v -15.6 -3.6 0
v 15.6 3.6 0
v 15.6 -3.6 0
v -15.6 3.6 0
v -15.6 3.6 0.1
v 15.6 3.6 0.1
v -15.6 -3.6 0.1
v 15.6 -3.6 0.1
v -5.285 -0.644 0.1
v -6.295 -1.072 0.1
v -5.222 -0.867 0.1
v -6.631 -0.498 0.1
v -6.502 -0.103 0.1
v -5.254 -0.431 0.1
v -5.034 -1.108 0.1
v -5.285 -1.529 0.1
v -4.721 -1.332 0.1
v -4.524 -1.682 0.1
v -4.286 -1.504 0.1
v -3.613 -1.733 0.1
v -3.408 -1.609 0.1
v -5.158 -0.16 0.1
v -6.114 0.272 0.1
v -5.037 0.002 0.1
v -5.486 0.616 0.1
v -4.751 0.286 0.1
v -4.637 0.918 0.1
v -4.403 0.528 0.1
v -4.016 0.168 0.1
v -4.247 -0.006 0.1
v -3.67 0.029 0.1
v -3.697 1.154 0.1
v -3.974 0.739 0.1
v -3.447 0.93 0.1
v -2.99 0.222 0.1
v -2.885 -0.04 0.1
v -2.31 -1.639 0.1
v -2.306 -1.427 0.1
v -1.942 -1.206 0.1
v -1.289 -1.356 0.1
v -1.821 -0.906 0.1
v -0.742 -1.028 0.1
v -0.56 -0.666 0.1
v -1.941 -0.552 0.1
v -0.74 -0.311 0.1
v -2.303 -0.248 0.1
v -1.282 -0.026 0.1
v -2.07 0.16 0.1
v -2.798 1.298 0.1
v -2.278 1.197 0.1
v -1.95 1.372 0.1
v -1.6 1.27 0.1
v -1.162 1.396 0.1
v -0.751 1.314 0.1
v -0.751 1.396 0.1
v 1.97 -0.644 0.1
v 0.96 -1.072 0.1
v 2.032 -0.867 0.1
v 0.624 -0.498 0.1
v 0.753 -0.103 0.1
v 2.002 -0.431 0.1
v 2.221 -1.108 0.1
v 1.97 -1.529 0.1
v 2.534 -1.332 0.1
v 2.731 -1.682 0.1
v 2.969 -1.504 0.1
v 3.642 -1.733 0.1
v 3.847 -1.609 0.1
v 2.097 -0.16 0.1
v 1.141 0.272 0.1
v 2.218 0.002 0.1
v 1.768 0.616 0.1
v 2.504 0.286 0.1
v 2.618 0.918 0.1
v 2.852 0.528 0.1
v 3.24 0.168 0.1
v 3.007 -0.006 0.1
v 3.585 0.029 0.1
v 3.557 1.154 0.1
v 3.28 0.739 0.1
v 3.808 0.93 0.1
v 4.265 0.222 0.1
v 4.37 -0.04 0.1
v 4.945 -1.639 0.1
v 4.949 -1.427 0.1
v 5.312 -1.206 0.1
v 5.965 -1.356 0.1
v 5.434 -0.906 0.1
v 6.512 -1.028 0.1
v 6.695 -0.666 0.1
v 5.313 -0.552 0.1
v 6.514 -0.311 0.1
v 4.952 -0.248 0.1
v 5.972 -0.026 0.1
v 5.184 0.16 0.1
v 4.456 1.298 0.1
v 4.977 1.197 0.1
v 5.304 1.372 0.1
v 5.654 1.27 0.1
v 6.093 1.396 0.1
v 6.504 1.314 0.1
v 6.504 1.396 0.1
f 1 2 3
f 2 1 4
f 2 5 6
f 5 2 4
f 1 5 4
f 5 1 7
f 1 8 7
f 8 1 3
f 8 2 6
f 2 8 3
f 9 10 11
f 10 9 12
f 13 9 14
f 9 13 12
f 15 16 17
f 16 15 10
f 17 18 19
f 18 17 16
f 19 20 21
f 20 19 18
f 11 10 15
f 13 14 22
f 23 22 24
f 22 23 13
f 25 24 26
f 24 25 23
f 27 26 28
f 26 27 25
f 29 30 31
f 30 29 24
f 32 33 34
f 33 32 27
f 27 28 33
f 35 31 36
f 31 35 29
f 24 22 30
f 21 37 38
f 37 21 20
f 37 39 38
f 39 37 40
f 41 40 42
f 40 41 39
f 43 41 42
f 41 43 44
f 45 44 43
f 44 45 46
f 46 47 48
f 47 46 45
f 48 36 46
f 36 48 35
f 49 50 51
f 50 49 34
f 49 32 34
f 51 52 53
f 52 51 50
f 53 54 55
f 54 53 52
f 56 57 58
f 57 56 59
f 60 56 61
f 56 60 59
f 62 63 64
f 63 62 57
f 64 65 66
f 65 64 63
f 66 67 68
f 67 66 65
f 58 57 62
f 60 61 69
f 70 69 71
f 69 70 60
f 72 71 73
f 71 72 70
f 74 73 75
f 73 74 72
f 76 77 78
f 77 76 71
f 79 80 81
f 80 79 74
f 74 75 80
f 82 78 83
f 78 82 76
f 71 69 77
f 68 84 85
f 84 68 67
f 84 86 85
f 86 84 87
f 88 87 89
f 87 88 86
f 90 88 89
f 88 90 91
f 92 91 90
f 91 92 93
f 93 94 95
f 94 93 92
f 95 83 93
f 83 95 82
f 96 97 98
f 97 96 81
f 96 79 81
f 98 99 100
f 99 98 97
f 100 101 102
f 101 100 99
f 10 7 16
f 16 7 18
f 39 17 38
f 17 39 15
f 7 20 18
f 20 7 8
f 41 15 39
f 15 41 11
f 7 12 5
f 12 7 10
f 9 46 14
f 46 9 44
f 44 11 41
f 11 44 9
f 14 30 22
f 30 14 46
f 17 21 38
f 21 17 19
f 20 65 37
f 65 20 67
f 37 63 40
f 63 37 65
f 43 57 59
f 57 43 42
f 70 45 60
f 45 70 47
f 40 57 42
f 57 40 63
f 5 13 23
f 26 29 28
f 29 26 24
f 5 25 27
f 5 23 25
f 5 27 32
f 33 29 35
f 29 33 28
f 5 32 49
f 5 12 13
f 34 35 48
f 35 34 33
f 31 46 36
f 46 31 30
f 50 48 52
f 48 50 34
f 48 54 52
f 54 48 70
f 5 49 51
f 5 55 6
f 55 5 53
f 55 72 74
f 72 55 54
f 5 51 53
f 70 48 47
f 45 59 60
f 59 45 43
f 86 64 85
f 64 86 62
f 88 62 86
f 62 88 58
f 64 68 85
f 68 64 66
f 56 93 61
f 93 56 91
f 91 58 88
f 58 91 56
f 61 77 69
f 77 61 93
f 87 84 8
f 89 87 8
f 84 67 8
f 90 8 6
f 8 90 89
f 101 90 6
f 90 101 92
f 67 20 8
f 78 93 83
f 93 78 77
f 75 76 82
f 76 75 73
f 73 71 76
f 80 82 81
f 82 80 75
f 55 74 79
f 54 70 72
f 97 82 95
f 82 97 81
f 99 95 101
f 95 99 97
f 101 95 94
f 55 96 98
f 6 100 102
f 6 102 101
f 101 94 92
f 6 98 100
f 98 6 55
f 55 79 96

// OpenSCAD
// file: ../p/box5-12.scad
use <../lib.scad>
function ldraw_lib__box5_12() = [
// 0 Box with 5 Faces without Any Edges
// 0 Name: box5-12.dat
// 0 Author: Chris Dee [cwdee]
// 0 !LDRAW_ORG Primitive UPDATE 2009-02
// 0 !LICENSE Licensed under CC BY 4.0 : see CAreadme.txt
// 
// 0 BFC CERTIFY CCW
  [0,"BFC","CERTIFY"],
  [0,"BFC","CCW"],
// 
// 0 !HISTORY 2009-09-03 [PTadmin] Official Update 2009-02
// 
// 
// 4 16 1 1 1 1 1 -1 -1 1 -1 -1 1 1
  [4,16,1,1,1,1,1,-1,-1,1,-1,-1,1,1],
// 4 16 -1 0 1 1 0 1 1 1 1 -1 1 1
  [4,16,-1,0,1,1,0,1,1,1,1,-1,1,1],
// 4 16 -1 0 -1 -1 0 1 -1 1 1 -1 1 -1
  [4,16,-1,0,-1,-1,0,1,-1,1,1,-1,1,-1],
// 4 16 1 0 -1 -1 0 -1 -1 1 -1 1 1 -1
  [4,16,1,0,-1,-1,0,-1,-1,1,-1,1,1,-1],
// 4 16 1 0 1 1 0 -1 1 1 -1 1 1 1
  [4,16,1,0,1,1,0,-1,1,1,-1,1,1,1],
// 0
];
module ldraw_lib__box5_12(step=0, col=false, unit=2/5, alt=false, line=0.2, solid=!$preview)
    makepoly(ldraw_lib__box5_12(), step=step, col=col, unit=unit, alt=alt, line=line, solid=solid);
ldraw_lib__box5_12(line=0.2);
// main file
use <../lib.scad>
use <../p/box5-12.scad>
function ldraw_lib__4188571j() = [
// 0 Sticker  0.9 x  3.9 with Black "66"
// 0 Name: 4188571j.dat
// 0 Author: Gerald Lasser [GeraldLasser]
// 0 !LDRAW_ORG Part UPDATE 2015-01
// 0 !LICENSE Licensed under CC BY 4.0 : see CAreadme.txt
// 
// 0 BFC CERTIFY CCW
  [0,"BFC","CERTIFY"],
  [0,"BFC","CCW"],
// 
// 0 !KEYWORDS santa fe, Train
// 
// 0 !HISTORY 2015-10-11 [PTadmin] Official Update 2015-01
// 
// 
// 0 // Original Text Produced by txt2dat, Copyright 2005-2007, 2009 R. Crawford
// 0 // Using font: "Times New Roman" style: "Regular" size: 40pt
// 0 // LDRAW Scaling of Txt2dat output: 1.02 0 0 0 1 0 0 0 0.32
// 
// 1 80 0 -0.25 0 39 0 0 0 0.25 0 0 0 9 box5-12.dat
  [1,80,0,-0.25,0,39,0,0,0,0.25,0,0,0,9, ldraw_lib__box5_12()],
// 
// 4 0 -15.737 -0.25 -2.68 -13.056 -0.25 -2.167 -13.213 -0.25 -1.611 -16.578 -0.25 -1.244
  [4,0,-15.737,-0.25,-2.68,-13.056,-0.25,-2.167,-13.213,-0.25,-1.611,-16.578,-0.25,-1.244],
// 4 0 -16.578 -0.25 -1.244 -13.213 -0.25 -1.611 -13.134 -0.25 -1.077 -16.255 -0.25 -0.258
  [4,0,-16.578,-0.25,-1.244,-13.213,-0.25,-1.611,-13.134,-0.25,-1.077,-16.255,-0.25,-0.258],
// 4 0 -12.584 -0.25 -2.769 -15.737 -0.25 -2.68 -13.213 -0.25 -3.822 -11.802 -0.25 -3.33
  [4,0,-12.584,-0.25,-2.769,-15.737,-0.25,-2.68,-13.213,-0.25,-3.822,-11.802,-0.25,-3.33],
// 4 0 -10.716 -0.25 -3.761 -11.802 -0.25 -3.33 -13.213 -0.25 -3.822 -11.309 -0.25 -4.205
  [4,0,-10.716,-0.25,-3.761,-11.802,-0.25,-3.33,-13.213,-0.25,-3.822,-11.309,-0.25,-4.205],
// 4 0 -10.716 -0.25 -3.761 -11.309 -0.25 -4.205 -9.033 -0.25 -4.333 -8.519 -0.25 -4.022
  [4,0,-10.716,-0.25,-3.761,-11.309,-0.25,-4.205,-9.033,-0.25,-4.333,-8.519,-0.25,-4.022],
// 3 0 -13.056 -0.25 -2.167 -15.737 -0.25 -2.68 -12.584 -0.25 -2.769
  [3,0,-13.056,-0.25,-2.167,-15.737,-0.25,-2.68,-12.584,-0.25,-2.769],
// 3 0 -16.255 -0.25 -0.258 -13.134 -0.25 -1.077 -12.894 -0.25 -0.399
  [3,0,-16.255,-0.25,-0.258,-13.134,-0.25,-1.077,-12.894,-0.25,-0.399],
// 4 0 -12.593 -0.25 0.006 -15.286 -0.25 0.679 -16.255 -0.25 -0.258 -12.894 -0.25 -0.399
  [4,0,-12.593,-0.25,0.006,-15.286,-0.25,0.679,-16.255,-0.25,-0.258,-12.894,-0.25,-0.399],
// 4 0 -15.286 -0.25 0.679 -12.593 -0.25 0.006 -11.878 -0.25 0.716 -13.716 -0.25 1.539
  [4,0,-15.286,-0.25,0.679,-12.593,-0.25,0.006,-11.878,-0.25,0.716,-13.716,-0.25,1.539],
// 4 0 -11.008 -0.25 1.321 -11.592 -0.25 2.296 -13.716 -0.25 1.539 -11.878 -0.25 0.716
  [4,0,-11.008,-0.25,1.321,-11.592,-0.25,2.296,-13.716,-0.25,1.539,-11.878,-0.25,0.716],
// 4 0 -10.039 -0.25 0.419 -12.593 -0.25 0.006 -10.618 -0.25 -0.016 -9.175 -0.25 0.073
  [4,0,-10.039,-0.25,0.419,-12.593,-0.25,0.006,-10.618,-0.25,-0.016,-9.175,-0.25,0.073],
// 4 0 -8.617 -0.25 2.324 -9.243 -0.25 2.886 -11.592 -0.25 2.296 -9.936 -0.25 1.848
  [4,0,-8.617,-0.25,2.324,-9.243,-0.25,2.886,-11.592,-0.25,2.296,-9.936,-0.25,1.848],
// 3 0 -11.592 -0.25 2.296 -11.008 -0.25 1.321 -9.936 -0.25 1.848
  [3,0,-11.592,-0.25,2.296,-11.008,-0.25,1.321,-9.936,-0.25,1.848],
// 4 0 -7.475 -0.25 0.556 -10.039 -0.25 0.419 -9.175 -0.25 0.073 -7.213 -0.25 -0.1
  [4,0,-7.475,-0.25,0.556,-10.039,-0.25,0.419,-9.175,-0.25,0.073,-7.213,-0.25,-0.1],
// 3 0 -12.593 -0.25 0.006 -12.894 -0.25 -0.399 -10.618 -0.25 -0.016
  [3,0,-12.593,-0.25,0.006,-12.894,-0.25,-0.399,-10.618,-0.25,-0.016],
// 4 0 -8.519 -0.25 -4.022 -9.033 -0.25 -4.333 -5.774 -0.25 -4.097 -5.765 -0.25 -3.567
  [4,0,-8.519,-0.25,-4.022,-9.033,-0.25,-4.333,-5.774,-0.25,-4.097,-5.765,-0.25,-3.567],
// 4 0 -3.223 -0.25 -3.389 -4.855 -0.25 -3.014 -5.765 -0.25 -3.567 -5.774 -0.25 -4.097
  [4,0,-3.223,-0.25,-3.389,-4.855,-0.25,-3.014,-5.765,-0.25,-3.567,-5.774,-0.25,-4.097],
// 4 0 -1.855 -0.25 -2.569 -4.552 -0.25 -2.266 -4.855 -0.25 -3.014 -3.223 -0.25 -3.389
  [4,0,-1.855,-0.25,-2.569,-4.552,-0.25,-2.266,-4.855,-0.25,-3.014,-3.223,-0.25,-3.389],
// 4 0 -4.552 -0.25 -2.266 -1.855 -0.25 -2.569 -1.399 -0.25 -1.666 -4.853 -0.25 -1.38
  [4,0,-4.552,-0.25,-2.266,-1.855,-0.25,-2.569,-1.399,-0.25,-1.666,-4.853,-0.25,-1.38],
// 4 0 -4.853 -0.25 -1.38 -1.399 -0.25 -1.666 -1.851 -0.25 -0.777 -5.757 -0.25 -0.621
  [4,0,-4.853,-0.25,-1.38,-1.399,-0.25,-1.666,-1.851,-0.25,-0.777,-5.757,-0.25,-0.621],
// 4 0 -5.757 -0.25 -0.621 -1.851 -0.25 -0.777 -3.206 -0.25 -0.066 -5.176 -0.25 0.401
  [4,0,-5.757,-0.25,-0.621,-1.851,-0.25,-0.777,-3.206,-0.25,-0.066,-5.176,-0.25,0.401],
// 4 0 -5.176 -0.25 0.401 -7.475 -0.25 0.556 -7.213 -0.25 -0.1 -5.757 -0.25 -0.621
  [4,0,-5.176,-0.25,0.401,-7.475,-0.25,0.556,-7.213,-0.25,-0.1,-5.757,-0.25,-0.621],
// 4 0 -6.996 -0.25 3.246 -8.617 -0.25 2.324 -5.695 -0.25 2.993 -4.876 -0.25 3.429
  [4,0,-6.996,-0.25,3.246,-8.617,-0.25,2.324,-5.695,-0.25,2.993,-4.876,-0.25,3.429],
// 3 0 -6.996 -0.25 3.246 -9.243 -0.25 2.886 -8.617 -0.25 2.324
  [3,0,-6.996,-0.25,3.246,-9.243,-0.25,2.886,-8.617,-0.25,2.324],
// 4 0 -4.876 -0.25 3.429 -5.695 -0.25 2.993 -4 -0.25 3.176 -2.905 -0.25 3.49
  [4,0,-4.876,-0.25,3.429,-5.695,-0.25,2.993,-4,-0.25,3.176,-2.905,-0.25,3.49],
// 4 0 -2.905 -0.25 3.49 -4 -0.25 3.176 -1.878 -0.25 3.285 -1.878 -0.25 3.49
  [4,0,-2.905,-0.25,3.49,-4,-0.25,3.176,-1.878,-0.25,3.285,-1.878,-0.25,3.49],
// 4 0 2.4 -0.25 -2.68 5.081 -0.25 -2.167 4.924 -0.25 -1.611 1.559 -0.25 -1.244
  [4,0,2.4,-0.25,-2.68,5.081,-0.25,-2.167,4.924,-0.25,-1.611,1.559,-0.25,-1.244],
// 4 0 1.559 -0.25 -1.244 4.924 -0.25 -1.611 5.004 -0.25 -1.077 1.882 -0.25 -0.258
  [4,0,1.559,-0.25,-1.244,4.924,-0.25,-1.611,5.004,-0.25,-1.077,1.882,-0.25,-0.258],
// 4 0 5.553 -0.25 -2.769 2.4 -0.25 -2.68 4.924 -0.25 -3.822 6.334 -0.25 -3.33
  [4,0,5.553,-0.25,-2.769,2.4,-0.25,-2.68,4.924,-0.25,-3.822,6.334,-0.25,-3.33],
// 4 0 7.422 -0.25 -3.761 6.334 -0.25 -3.33 4.924 -0.25 -3.822 6.828 -0.25 -4.205
  [4,0,7.422,-0.25,-3.761,6.334,-0.25,-3.33,4.924,-0.25,-3.822,6.828,-0.25,-4.205],
// 4 0 7.422 -0.25 -3.761 6.828 -0.25 -4.205 9.104 -0.25 -4.333 9.618 -0.25 -4.022
  [4,0,7.422,-0.25,-3.761,6.828,-0.25,-4.205,9.104,-0.25,-4.333,9.618,-0.25,-4.022],
// 3 0 5.081 -0.25 -2.167 2.4 -0.25 -2.68 5.553 -0.25 -2.769
  [3,0,5.081,-0.25,-2.167,2.4,-0.25,-2.68,5.553,-0.25,-2.769],
// 3 0 1.882 -0.25 -0.258 5.004 -0.25 -1.077 5.243 -0.25 -0.399
  [3,0,1.882,-0.25,-0.258,5.004,-0.25,-1.077,5.243,-0.25,-0.399],
// 4 0 5.544 -0.25 0.006 2.852 -0.25 0.679 1.882 -0.25 -0.258 5.243 -0.25 -0.399
  [4,0,5.544,-0.25,0.006,2.852,-0.25,0.679,1.882,-0.25,-0.258,5.243,-0.25,-0.399],
// 4 0 2.852 -0.25 0.679 5.544 -0.25 0.006 6.259 -0.25 0.716 4.421 -0.25 1.539
  [4,0,2.852,-0.25,0.679,5.544,-0.25,0.006,6.259,-0.25,0.716,4.421,-0.25,1.539],
// 4 0 7.129 -0.25 1.321 6.544 -0.25 2.296 4.421 -0.25 1.539 6.259 -0.25 0.716
  [4,0,7.129,-0.25,1.321,6.544,-0.25,2.296,4.421,-0.25,1.539,6.259,-0.25,0.716],
// 4 0 8.099 -0.25 0.419 5.544 -0.25 0.006 7.518 -0.25 -0.016 8.962 -0.25 0.073
  [4,0,8.099,-0.25,0.419,5.544,-0.25,0.006,7.518,-0.25,-0.016,8.962,-0.25,0.073],
// 4 0 9.52 -0.25 2.324 8.893 -0.25 2.886 6.544 -0.25 2.296 8.201 -0.25 1.848
  [4,0,9.52,-0.25,2.324,8.893,-0.25,2.886,6.544,-0.25,2.296,8.201,-0.25,1.848],
// 3 0 6.544 -0.25 2.296 7.129 -0.25 1.321 8.201 -0.25 1.848
  [3,0,6.544,-0.25,2.296,7.129,-0.25,1.321,8.201,-0.25,1.848],
// 4 0 10.662 -0.25 0.556 8.099 -0.25 0.419 8.962 -0.25 0.073 10.924 -0.25 -0.1
  [4,0,10.662,-0.25,0.556,8.099,-0.25,0.419,8.962,-0.25,0.073,10.924,-0.25,-0.1],
// 3 0 5.544 -0.25 0.006 5.243 -0.25 -0.399 7.518 -0.25 -0.016
  [3,0,5.544,-0.25,0.006,5.243,-0.25,-0.399,7.518,-0.25,-0.016],
// 4 0 9.618 -0.25 -4.022 9.104 -0.25 -4.333 12.363 -0.25 -4.097 12.372 -0.25 -3.567
  [4,0,9.618,-0.25,-4.022,9.104,-0.25,-4.333,12.363,-0.25,-4.097,12.372,-0.25,-3.567],
// 4 0 14.913 -0.25 -3.389 13.281 -0.25 -3.014 12.372 -0.25 -3.567 12.363 -0.25 -4.097
  [4,0,14.913,-0.25,-3.389,13.281,-0.25,-3.014,12.372,-0.25,-3.567,12.363,-0.25,-4.097],
// 4 0 16.281 -0.25 -2.569 13.585 -0.25 -2.266 13.281 -0.25 -3.014 14.913 -0.25 -3.389
  [4,0,16.281,-0.25,-2.569,13.585,-0.25,-2.266,13.281,-0.25,-3.014,14.913,-0.25,-3.389],
// 4 0 13.585 -0.25 -2.266 16.281 -0.25 -2.569 16.737 -0.25 -1.666 13.283 -0.25 -1.38
  [4,0,13.585,-0.25,-2.266,16.281,-0.25,-2.569,16.737,-0.25,-1.666,13.283,-0.25,-1.38],
// 4 0 13.283 -0.25 -1.38 16.737 -0.25 -1.666 16.286 -0.25 -0.777 12.381 -0.25 -0.621
  [4,0,13.283,-0.25,-1.38,16.737,-0.25,-1.666,16.286,-0.25,-0.777,12.381,-0.25,-0.621],
// 4 0 12.381 -0.25 -0.621 16.286 -0.25 -0.777 14.931 -0.25 -0.066 12.96 -0.25 0.401
  [4,0,12.381,-0.25,-0.621,16.286,-0.25,-0.777,14.931,-0.25,-0.066,12.96,-0.25,0.401],
// 4 0 12.96 -0.25 0.401 10.662 -0.25 0.556 10.924 -0.25 -0.1 12.381 -0.25 -0.621
  [4,0,12.96,-0.25,0.401,10.662,-0.25,0.556,10.924,-0.25,-0.1,12.381,-0.25,-0.621],
// 4 0 11.14 -0.25 3.246 9.52 -0.25 2.324 12.442 -0.25 2.993 13.261 -0.25 3.429
  [4,0,11.14,-0.25,3.246,9.52,-0.25,2.324,12.442,-0.25,2.993,13.261,-0.25,3.429],
// 3 0 11.14 -0.25 3.246 8.893 -0.25 2.886 9.52 -0.25 2.324
  [3,0,11.14,-0.25,3.246,8.893,-0.25,2.886,9.52,-0.25,2.324],
// 4 0 13.261 -0.25 3.429 12.442 -0.25 2.993 14.136 -0.25 3.176 15.233 -0.25 3.49
  [4,0,13.261,-0.25,3.429,12.442,-0.25,2.993,14.136,-0.25,3.176,15.233,-0.25,3.49],
// 4 0 15.233 -0.25 3.49 14.136 -0.25 3.176 16.26 -0.25 3.285 16.26 -0.25 3.49
  [4,0,15.233,-0.25,3.49,14.136,-0.25,3.176,16.26,-0.25,3.285,16.26,-0.25,3.49],
// 3 80 -15.737 -0.25 -2.68 -39 -0.25 -9 -13.213 -0.25 -3.822
  [3,80,-15.737,-0.25,-2.68,-39,-0.25,-9,-13.213,-0.25,-3.822],
// 3 80 -13.213 -0.25 -3.822 -39 -0.25 -9 -11.309 -0.25 -4.205
  [3,80,-13.213,-0.25,-3.822,-39,-0.25,-9,-11.309,-0.25,-4.205],
// 4 80 -4.855 -0.25 -3.014 -12.584 -0.25 -2.769 -11.802 -0.25 -3.33 -5.765 -0.25 -3.567
  [4,80,-4.855,-0.25,-3.014,-12.584,-0.25,-2.769,-11.802,-0.25,-3.33,-5.765,-0.25,-3.567],
// 4 80 -9.033 -0.25 -4.333 -11.309 -0.25 -4.205 -39 -0.25 -9 39 -0.25 -9
  [4,80,-9.033,-0.25,-4.333,-11.309,-0.25,-4.205,-39,-0.25,-9,39,-0.25,-9],
// 4 80 -4.552 -0.25 -2.266 -13.056 -0.25 -2.167 -12.584 -0.25 -2.769 -4.855 -0.25 -3.014
  [4,80,-4.552,-0.25,-2.266,-13.056,-0.25,-2.167,-12.584,-0.25,-2.769,-4.855,-0.25,-3.014],
// 4 80 -39 -0.25 -9 -15.737 -0.25 -2.68 -16.578 -0.25 -1.244 -39 -0.25 9
  [4,80,-39,-0.25,-9,-15.737,-0.25,-2.68,-16.578,-0.25,-1.244,-39,-0.25,9],
// 4 80 -5.757 -0.25 -0.621 -13.134 -0.25 -1.077 -13.213 -0.25 -1.611 -4.853 -0.25 -1.38
  [4,80,-5.757,-0.25,-0.621,-13.134,-0.25,-1.077,-13.213,-0.25,-1.611,-4.853,-0.25,-1.38],
// 4 80 -4.853 -0.25 -1.38 -13.213 -0.25 -1.611 -13.056 -0.25 -2.167 -4.552 -0.25 -2.266
  [4,80,-4.853,-0.25,-1.38,-13.213,-0.25,-1.611,-13.056,-0.25,-2.167,-4.552,-0.25,-2.266],
// 4 80 -10.618 -0.25 -0.016 -12.894 -0.25 -0.399 -13.134 -0.25 -1.077 -5.757 -0.25 -0.621
  [4,80,-10.618,-0.25,-0.016,-12.894,-0.25,-0.399,-13.134,-0.25,-1.077,-5.757,-0.25,-0.621],
// 4 80 -5.765 -0.25 -3.567 -11.802 -0.25 -3.33 -10.716 -0.25 -3.761 -8.519 -0.25 -4.022
  [4,80,-5.765,-0.25,-3.567,-11.802,-0.25,-3.33,-10.716,-0.25,-3.761,-8.519,-0.25,-4.022],
// 4 80 6.828 -0.25 -4.205 -5.774 -0.25 -4.097 -9.033 -0.25 -4.333 9.104 -0.25 -4.333
  [4,80,6.828,-0.25,-4.205,-5.774,-0.25,-4.097,-9.033,-0.25,-4.333,9.104,-0.25,-4.333],
// 4 80 4.924 -0.25 -3.822 -3.223 -0.25 -3.389 -5.774 -0.25 -4.097 6.828 -0.25 -4.205
  [4,80,4.924,-0.25,-3.822,-3.223,-0.25,-3.389,-5.774,-0.25,-4.097,6.828,-0.25,-4.205],
// 4 80 -1.399 -0.25 -1.666 -1.855 -0.25 -2.569 2.4 -0.25 -2.68 1.559 -0.25 -1.244
  [4,80,-1.399,-0.25,-1.666,-1.855,-0.25,-2.569,2.4,-0.25,-2.68,1.559,-0.25,-1.244],
// 4 80 -3.206 -0.25 -0.066 -1.851 -0.25 -0.777 1.882 -0.25 -0.258 2.852 -0.25 0.679
  [4,80,-3.206,-0.25,-0.066,-1.851,-0.25,-0.777,1.882,-0.25,-0.258,2.852,-0.25,0.679],
// 4 80 2.4 -0.25 -2.68 -1.855 -0.25 -2.569 -3.223 -0.25 -3.389 4.924 -0.25 -3.822
  [4,80,2.4,-0.25,-2.68,-1.855,-0.25,-2.569,-3.223,-0.25,-3.389,4.924,-0.25,-3.822],
// 3 80 -39 -0.25 9 -16.255 -0.25 -0.258 -15.286 -0.25 0.679
  [3,80,-39,-0.25,9,-16.255,-0.25,-0.258,-15.286,-0.25,0.679],
// 4 80 -11.878 -0.25 0.716 -12.593 -0.25 0.006 -10.039 -0.25 0.419 -11.008 -0.25 1.321
  [4,80,-11.878,-0.25,0.716,-12.593,-0.25,0.006,-10.039,-0.25,0.419,-11.008,-0.25,1.321],
// 3 80 -39 -0.25 9 -13.716 -0.25 1.539 -11.592 -0.25 2.296
  [3,80,-39,-0.25,9,-13.716,-0.25,1.539,-11.592,-0.25,2.296],
// 3 80 -39 -0.25 9 -15.286 -0.25 0.679 -13.716 -0.25 1.539
  [3,80,-39,-0.25,9,-15.286,-0.25,0.679,-13.716,-0.25,1.539],
// 3 80 -39 -0.25 9 -11.592 -0.25 2.296 -9.243 -0.25 2.886
  [3,80,-39,-0.25,9,-11.592,-0.25,2.296,-9.243,-0.25,2.886],
// 4 80 -7.475 -0.25 0.556 -9.936 -0.25 1.848 -11.008 -0.25 1.321 -10.039 -0.25 0.419
  [4,80,-7.475,-0.25,0.556,-9.936,-0.25,1.848,-11.008,-0.25,1.321,-10.039,-0.25,0.419],
// 3 80 -39 -0.25 9 -9.243 -0.25 2.886 -6.996 -0.25 3.246
  [3,80,-39,-0.25,9,-9.243,-0.25,2.886,-6.996,-0.25,3.246],
// 3 80 -39 -0.25 9 -16.578 -0.25 -1.244 -16.255 -0.25 -0.258
  [3,80,-39,-0.25,9,-16.578,-0.25,-1.244,-16.255,-0.25,-0.258],
// 4 80 -8.617 -0.25 2.324 -9.936 -0.25 1.848 -7.475 -0.25 0.556 -5.176 -0.25 0.401
  [4,80,-8.617,-0.25,2.324,-9.936,-0.25,1.848,-7.475,-0.25,0.556,-5.176,-0.25,0.401],
// 4 80 -5.757 -0.25 -0.621 -7.213 -0.25 -0.1 -9.175 -0.25 0.073 -10.618 -0.25 -0.016
  [4,80,-5.757,-0.25,-0.621,-7.213,-0.25,-0.1,-9.175,-0.25,0.073,-10.618,-0.25,-0.016],
// 4 80 -5.695 -0.25 2.993 -8.617 -0.25 2.324 -5.176 -0.25 0.401 -4 -0.25 3.176
  [4,80,-5.695,-0.25,2.993,-8.617,-0.25,2.324,-5.176,-0.25,0.401,-4,-0.25,3.176],
// 4 80 -5.176 -0.25 0.401 2.852 -0.25 0.679 -1.878 -0.25 3.285 -4 -0.25 3.176
  [4,80,-5.176,-0.25,0.401,2.852,-0.25,0.679,-1.878,-0.25,3.285,-4,-0.25,3.176],
// 3 80 -39 -0.25 9 -6.996 -0.25 3.246 -4.876 -0.25 3.429
  [3,80,-39,-0.25,9,-6.996,-0.25,3.246,-4.876,-0.25,3.429],
// 4 80 -39 -0.25 9 -2.905 -0.25 3.49 -1.878 -0.25 3.49 39 -0.25 9
  [4,80,-39,-0.25,9,-2.905,-0.25,3.49,-1.878,-0.25,3.49,39,-0.25,9],
// 4 80 6.544 -0.25 2.296 -1.878 -0.25 3.49 -1.878 -0.25 3.285 4.421 -0.25 1.539
  [4,80,6.544,-0.25,2.296,-1.878,-0.25,3.49,-1.878,-0.25,3.285,4.421,-0.25,1.539],
// 3 80 -39 -0.25 9 -4.876 -0.25 3.429 -2.905 -0.25 3.49
  [3,80,-39,-0.25,9,-4.876,-0.25,3.429,-2.905,-0.25,3.49],
// 3 80 2.852 -0.25 0.679 -5.176 -0.25 0.401 -3.206 -0.25 -0.066
  [3,80,2.852,-0.25,0.679,-5.176,-0.25,0.401,-3.206,-0.25,-0.066],
// 4 80 -1.851 -0.25 -0.777 -1.399 -0.25 -1.666 1.559 -0.25 -1.244 1.882 -0.25 -0.258
  [4,80,-1.851,-0.25,-0.777,-1.399,-0.25,-1.666,1.559,-0.25,-1.244,1.882,-0.25,-0.258],
// 4 80 13.281 -0.25 -3.014 5.553 -0.25 -2.769 6.334 -0.25 -3.33 12.372 -0.25 -3.567
  [4,80,13.281,-0.25,-3.014,5.553,-0.25,-2.769,6.334,-0.25,-3.33,12.372,-0.25,-3.567],
// 4 80 13.585 -0.25 -2.266 5.081 -0.25 -2.167 5.553 -0.25 -2.769 13.281 -0.25 -3.014
  [4,80,13.585,-0.25,-2.266,5.081,-0.25,-2.167,5.553,-0.25,-2.769,13.281,-0.25,-3.014],
// 4 80 12.372 -0.25 -3.567 6.334 -0.25 -3.33 7.422 -0.25 -3.761 9.618 -0.25 -4.022
  [4,80,12.372,-0.25,-3.567,6.334,-0.25,-3.33,7.422,-0.25,-3.761,9.618,-0.25,-4.022],
// 4 80 12.381 -0.25 -0.621 5.004 -0.25 -1.077 4.924 -0.25 -1.611 13.283 -0.25 -1.38
  [4,80,12.381,-0.25,-0.621,5.004,-0.25,-1.077,4.924,-0.25,-1.611,13.283,-0.25,-1.38],
// 4 80 13.283 -0.25 -1.38 4.924 -0.25 -1.611 5.081 -0.25 -2.167 13.585 -0.25 -2.266
  [4,80,13.283,-0.25,-1.38,4.924,-0.25,-1.611,5.081,-0.25,-2.167,13.585,-0.25,-2.266],
// 4 80 7.518 -0.25 -0.016 5.243 -0.25 -0.399 5.004 -0.25 -1.077 12.381 -0.25 -0.621
  [4,80,7.518,-0.25,-0.016,5.243,-0.25,-0.399,5.004,-0.25,-1.077,12.381,-0.25,-0.621],
// 3 80 14.913 -0.25 -3.389 12.363 -0.25 -4.097 39 -0.25 -9
  [3,80,14.913,-0.25,-3.389,12.363,-0.25,-4.097,39,-0.25,-9],
// 3 80 16.281 -0.25 -2.569 14.913 -0.25 -3.389 39 -0.25 -9
  [3,80,16.281,-0.25,-2.569,14.913,-0.25,-3.389,39,-0.25,-9],
// 3 80 12.363 -0.25 -4.097 9.104 -0.25 -4.333 39 -0.25 -9
  [3,80,12.363,-0.25,-4.097,9.104,-0.25,-4.333,39,-0.25,-9],
// 4 80 16.737 -0.25 -1.666 16.281 -0.25 -2.569 39 -0.25 -9 39 -0.25 9
  [4,80,16.737,-0.25,-1.666,16.281,-0.25,-2.569,39,-0.25,-9,39,-0.25,9],
// 4 80 16.286 -0.25 -0.777 16.737 -0.25 -1.666 39 -0.25 9 16.26 -0.25 3.285
  [4,80,16.286,-0.25,-0.777,16.737,-0.25,-1.666,39,-0.25,9,16.26,-0.25,3.285],
// 3 80 9.104 -0.25 -4.333 -9.033 -0.25 -4.333 39 -0.25 -9
  [3,80,9.104,-0.25,-4.333,-9.033,-0.25,-4.333,39,-0.25,-9],
// 4 80 8.962 -0.25 0.073 7.518 -0.25 -0.016 12.381 -0.25 -0.621 10.924 -0.25 -0.1
  [4,80,8.962,-0.25,0.073,7.518,-0.25,-0.016,12.381,-0.25,-0.621,10.924,-0.25,-0.1],
// 4 80 8.099 -0.25 0.419 10.662 -0.25 0.556 7.129 -0.25 1.321 6.259 -0.25 0.716
  [4,80,8.099,-0.25,0.419,10.662,-0.25,0.556,7.129,-0.25,1.321,6.259,-0.25,0.716],
// 3 80 6.259 -0.25 0.716 5.544 -0.25 0.006 8.099 -0.25 0.419
  [3,80,6.259,-0.25,0.716,5.544,-0.25,0.006,8.099,-0.25,0.419],
// 4 80 8.201 -0.25 1.848 7.129 -0.25 1.321 10.662 -0.25 0.556 9.52 -0.25 2.324
  [4,80,8.201,-0.25,1.848,7.129,-0.25,1.321,10.662,-0.25,0.556,9.52,-0.25,2.324],
// 3 80 -1.878 -0.25 3.49 6.544 -0.25 2.296 8.893 -0.25 2.886
  [3,80,-1.878,-0.25,3.49,6.544,-0.25,2.296,8.893,-0.25,2.886],
// 3 80 -1.878 -0.25 3.285 2.852 -0.25 0.679 4.421 -0.25 1.539
  [3,80,-1.878,-0.25,3.285,2.852,-0.25,0.679,4.421,-0.25,1.539],
// 4 80 9.52 -0.25 2.324 10.662 -0.25 0.556 12.96 -0.25 0.401 12.442 -0.25 2.993
  [4,80,9.52,-0.25,2.324,10.662,-0.25,0.556,12.96,-0.25,0.401,12.442,-0.25,2.993],
// 4 80 14.136 -0.25 3.176 12.442 -0.25 2.993 12.96 -0.25 0.401 16.26 -0.25 3.285
  [4,80,14.136,-0.25,3.176,12.442,-0.25,2.993,12.96,-0.25,0.401,16.26,-0.25,3.285],
// 3 80 16.26 -0.25 3.285 12.96 -0.25 0.401 14.931 -0.25 -0.066
  [3,80,16.26,-0.25,3.285,12.96,-0.25,0.401,14.931,-0.25,-0.066],
// 3 80 -1.878 -0.25 3.49 11.14 -0.25 3.246 13.261 -0.25 3.429
  [3,80,-1.878,-0.25,3.49,11.14,-0.25,3.246,13.261,-0.25,3.429],
// 3 80 39 -0.25 9 15.233 -0.25 3.49 16.26 -0.25 3.49
  [3,80,39,-0.25,9,15.233,-0.25,3.49,16.26,-0.25,3.49],
// 3 80 39 -0.25 9 16.26 -0.25 3.49 16.26 -0.25 3.285
  [3,80,39,-0.25,9,16.26,-0.25,3.49,16.26,-0.25,3.285],
// 3 80 16.26 -0.25 3.285 14.931 -0.25 -0.066 16.286 -0.25 -0.777
  [3,80,16.26,-0.25,3.285,14.931,-0.25,-0.066,16.286,-0.25,-0.777],
// 4 80 15.233 -0.25 3.49 39 -0.25 9 -1.878 -0.25 3.49 13.261 -0.25 3.429
  [4,80,15.233,-0.25,3.49,39,-0.25,9,-1.878,-0.25,3.49,13.261,-0.25,3.429],
// 3 80 -1.878 -0.25 3.49 8.893 -0.25 2.886 11.14 -0.25 3.246
  [3,80,-1.878,-0.25,3.49,8.893,-0.25,2.886,11.14,-0.25,3.246],
];
module ldraw_lib__4188571j(step=0, col=false, unit=2/5, alt=false, line=0.2, solid=!$preview)
    makepoly(ldraw_lib__4188571j(), step=step, col=col, unit=unit, alt=alt, line=line, solid=solid);
ldraw_lib__4188571j(line=0.2);
